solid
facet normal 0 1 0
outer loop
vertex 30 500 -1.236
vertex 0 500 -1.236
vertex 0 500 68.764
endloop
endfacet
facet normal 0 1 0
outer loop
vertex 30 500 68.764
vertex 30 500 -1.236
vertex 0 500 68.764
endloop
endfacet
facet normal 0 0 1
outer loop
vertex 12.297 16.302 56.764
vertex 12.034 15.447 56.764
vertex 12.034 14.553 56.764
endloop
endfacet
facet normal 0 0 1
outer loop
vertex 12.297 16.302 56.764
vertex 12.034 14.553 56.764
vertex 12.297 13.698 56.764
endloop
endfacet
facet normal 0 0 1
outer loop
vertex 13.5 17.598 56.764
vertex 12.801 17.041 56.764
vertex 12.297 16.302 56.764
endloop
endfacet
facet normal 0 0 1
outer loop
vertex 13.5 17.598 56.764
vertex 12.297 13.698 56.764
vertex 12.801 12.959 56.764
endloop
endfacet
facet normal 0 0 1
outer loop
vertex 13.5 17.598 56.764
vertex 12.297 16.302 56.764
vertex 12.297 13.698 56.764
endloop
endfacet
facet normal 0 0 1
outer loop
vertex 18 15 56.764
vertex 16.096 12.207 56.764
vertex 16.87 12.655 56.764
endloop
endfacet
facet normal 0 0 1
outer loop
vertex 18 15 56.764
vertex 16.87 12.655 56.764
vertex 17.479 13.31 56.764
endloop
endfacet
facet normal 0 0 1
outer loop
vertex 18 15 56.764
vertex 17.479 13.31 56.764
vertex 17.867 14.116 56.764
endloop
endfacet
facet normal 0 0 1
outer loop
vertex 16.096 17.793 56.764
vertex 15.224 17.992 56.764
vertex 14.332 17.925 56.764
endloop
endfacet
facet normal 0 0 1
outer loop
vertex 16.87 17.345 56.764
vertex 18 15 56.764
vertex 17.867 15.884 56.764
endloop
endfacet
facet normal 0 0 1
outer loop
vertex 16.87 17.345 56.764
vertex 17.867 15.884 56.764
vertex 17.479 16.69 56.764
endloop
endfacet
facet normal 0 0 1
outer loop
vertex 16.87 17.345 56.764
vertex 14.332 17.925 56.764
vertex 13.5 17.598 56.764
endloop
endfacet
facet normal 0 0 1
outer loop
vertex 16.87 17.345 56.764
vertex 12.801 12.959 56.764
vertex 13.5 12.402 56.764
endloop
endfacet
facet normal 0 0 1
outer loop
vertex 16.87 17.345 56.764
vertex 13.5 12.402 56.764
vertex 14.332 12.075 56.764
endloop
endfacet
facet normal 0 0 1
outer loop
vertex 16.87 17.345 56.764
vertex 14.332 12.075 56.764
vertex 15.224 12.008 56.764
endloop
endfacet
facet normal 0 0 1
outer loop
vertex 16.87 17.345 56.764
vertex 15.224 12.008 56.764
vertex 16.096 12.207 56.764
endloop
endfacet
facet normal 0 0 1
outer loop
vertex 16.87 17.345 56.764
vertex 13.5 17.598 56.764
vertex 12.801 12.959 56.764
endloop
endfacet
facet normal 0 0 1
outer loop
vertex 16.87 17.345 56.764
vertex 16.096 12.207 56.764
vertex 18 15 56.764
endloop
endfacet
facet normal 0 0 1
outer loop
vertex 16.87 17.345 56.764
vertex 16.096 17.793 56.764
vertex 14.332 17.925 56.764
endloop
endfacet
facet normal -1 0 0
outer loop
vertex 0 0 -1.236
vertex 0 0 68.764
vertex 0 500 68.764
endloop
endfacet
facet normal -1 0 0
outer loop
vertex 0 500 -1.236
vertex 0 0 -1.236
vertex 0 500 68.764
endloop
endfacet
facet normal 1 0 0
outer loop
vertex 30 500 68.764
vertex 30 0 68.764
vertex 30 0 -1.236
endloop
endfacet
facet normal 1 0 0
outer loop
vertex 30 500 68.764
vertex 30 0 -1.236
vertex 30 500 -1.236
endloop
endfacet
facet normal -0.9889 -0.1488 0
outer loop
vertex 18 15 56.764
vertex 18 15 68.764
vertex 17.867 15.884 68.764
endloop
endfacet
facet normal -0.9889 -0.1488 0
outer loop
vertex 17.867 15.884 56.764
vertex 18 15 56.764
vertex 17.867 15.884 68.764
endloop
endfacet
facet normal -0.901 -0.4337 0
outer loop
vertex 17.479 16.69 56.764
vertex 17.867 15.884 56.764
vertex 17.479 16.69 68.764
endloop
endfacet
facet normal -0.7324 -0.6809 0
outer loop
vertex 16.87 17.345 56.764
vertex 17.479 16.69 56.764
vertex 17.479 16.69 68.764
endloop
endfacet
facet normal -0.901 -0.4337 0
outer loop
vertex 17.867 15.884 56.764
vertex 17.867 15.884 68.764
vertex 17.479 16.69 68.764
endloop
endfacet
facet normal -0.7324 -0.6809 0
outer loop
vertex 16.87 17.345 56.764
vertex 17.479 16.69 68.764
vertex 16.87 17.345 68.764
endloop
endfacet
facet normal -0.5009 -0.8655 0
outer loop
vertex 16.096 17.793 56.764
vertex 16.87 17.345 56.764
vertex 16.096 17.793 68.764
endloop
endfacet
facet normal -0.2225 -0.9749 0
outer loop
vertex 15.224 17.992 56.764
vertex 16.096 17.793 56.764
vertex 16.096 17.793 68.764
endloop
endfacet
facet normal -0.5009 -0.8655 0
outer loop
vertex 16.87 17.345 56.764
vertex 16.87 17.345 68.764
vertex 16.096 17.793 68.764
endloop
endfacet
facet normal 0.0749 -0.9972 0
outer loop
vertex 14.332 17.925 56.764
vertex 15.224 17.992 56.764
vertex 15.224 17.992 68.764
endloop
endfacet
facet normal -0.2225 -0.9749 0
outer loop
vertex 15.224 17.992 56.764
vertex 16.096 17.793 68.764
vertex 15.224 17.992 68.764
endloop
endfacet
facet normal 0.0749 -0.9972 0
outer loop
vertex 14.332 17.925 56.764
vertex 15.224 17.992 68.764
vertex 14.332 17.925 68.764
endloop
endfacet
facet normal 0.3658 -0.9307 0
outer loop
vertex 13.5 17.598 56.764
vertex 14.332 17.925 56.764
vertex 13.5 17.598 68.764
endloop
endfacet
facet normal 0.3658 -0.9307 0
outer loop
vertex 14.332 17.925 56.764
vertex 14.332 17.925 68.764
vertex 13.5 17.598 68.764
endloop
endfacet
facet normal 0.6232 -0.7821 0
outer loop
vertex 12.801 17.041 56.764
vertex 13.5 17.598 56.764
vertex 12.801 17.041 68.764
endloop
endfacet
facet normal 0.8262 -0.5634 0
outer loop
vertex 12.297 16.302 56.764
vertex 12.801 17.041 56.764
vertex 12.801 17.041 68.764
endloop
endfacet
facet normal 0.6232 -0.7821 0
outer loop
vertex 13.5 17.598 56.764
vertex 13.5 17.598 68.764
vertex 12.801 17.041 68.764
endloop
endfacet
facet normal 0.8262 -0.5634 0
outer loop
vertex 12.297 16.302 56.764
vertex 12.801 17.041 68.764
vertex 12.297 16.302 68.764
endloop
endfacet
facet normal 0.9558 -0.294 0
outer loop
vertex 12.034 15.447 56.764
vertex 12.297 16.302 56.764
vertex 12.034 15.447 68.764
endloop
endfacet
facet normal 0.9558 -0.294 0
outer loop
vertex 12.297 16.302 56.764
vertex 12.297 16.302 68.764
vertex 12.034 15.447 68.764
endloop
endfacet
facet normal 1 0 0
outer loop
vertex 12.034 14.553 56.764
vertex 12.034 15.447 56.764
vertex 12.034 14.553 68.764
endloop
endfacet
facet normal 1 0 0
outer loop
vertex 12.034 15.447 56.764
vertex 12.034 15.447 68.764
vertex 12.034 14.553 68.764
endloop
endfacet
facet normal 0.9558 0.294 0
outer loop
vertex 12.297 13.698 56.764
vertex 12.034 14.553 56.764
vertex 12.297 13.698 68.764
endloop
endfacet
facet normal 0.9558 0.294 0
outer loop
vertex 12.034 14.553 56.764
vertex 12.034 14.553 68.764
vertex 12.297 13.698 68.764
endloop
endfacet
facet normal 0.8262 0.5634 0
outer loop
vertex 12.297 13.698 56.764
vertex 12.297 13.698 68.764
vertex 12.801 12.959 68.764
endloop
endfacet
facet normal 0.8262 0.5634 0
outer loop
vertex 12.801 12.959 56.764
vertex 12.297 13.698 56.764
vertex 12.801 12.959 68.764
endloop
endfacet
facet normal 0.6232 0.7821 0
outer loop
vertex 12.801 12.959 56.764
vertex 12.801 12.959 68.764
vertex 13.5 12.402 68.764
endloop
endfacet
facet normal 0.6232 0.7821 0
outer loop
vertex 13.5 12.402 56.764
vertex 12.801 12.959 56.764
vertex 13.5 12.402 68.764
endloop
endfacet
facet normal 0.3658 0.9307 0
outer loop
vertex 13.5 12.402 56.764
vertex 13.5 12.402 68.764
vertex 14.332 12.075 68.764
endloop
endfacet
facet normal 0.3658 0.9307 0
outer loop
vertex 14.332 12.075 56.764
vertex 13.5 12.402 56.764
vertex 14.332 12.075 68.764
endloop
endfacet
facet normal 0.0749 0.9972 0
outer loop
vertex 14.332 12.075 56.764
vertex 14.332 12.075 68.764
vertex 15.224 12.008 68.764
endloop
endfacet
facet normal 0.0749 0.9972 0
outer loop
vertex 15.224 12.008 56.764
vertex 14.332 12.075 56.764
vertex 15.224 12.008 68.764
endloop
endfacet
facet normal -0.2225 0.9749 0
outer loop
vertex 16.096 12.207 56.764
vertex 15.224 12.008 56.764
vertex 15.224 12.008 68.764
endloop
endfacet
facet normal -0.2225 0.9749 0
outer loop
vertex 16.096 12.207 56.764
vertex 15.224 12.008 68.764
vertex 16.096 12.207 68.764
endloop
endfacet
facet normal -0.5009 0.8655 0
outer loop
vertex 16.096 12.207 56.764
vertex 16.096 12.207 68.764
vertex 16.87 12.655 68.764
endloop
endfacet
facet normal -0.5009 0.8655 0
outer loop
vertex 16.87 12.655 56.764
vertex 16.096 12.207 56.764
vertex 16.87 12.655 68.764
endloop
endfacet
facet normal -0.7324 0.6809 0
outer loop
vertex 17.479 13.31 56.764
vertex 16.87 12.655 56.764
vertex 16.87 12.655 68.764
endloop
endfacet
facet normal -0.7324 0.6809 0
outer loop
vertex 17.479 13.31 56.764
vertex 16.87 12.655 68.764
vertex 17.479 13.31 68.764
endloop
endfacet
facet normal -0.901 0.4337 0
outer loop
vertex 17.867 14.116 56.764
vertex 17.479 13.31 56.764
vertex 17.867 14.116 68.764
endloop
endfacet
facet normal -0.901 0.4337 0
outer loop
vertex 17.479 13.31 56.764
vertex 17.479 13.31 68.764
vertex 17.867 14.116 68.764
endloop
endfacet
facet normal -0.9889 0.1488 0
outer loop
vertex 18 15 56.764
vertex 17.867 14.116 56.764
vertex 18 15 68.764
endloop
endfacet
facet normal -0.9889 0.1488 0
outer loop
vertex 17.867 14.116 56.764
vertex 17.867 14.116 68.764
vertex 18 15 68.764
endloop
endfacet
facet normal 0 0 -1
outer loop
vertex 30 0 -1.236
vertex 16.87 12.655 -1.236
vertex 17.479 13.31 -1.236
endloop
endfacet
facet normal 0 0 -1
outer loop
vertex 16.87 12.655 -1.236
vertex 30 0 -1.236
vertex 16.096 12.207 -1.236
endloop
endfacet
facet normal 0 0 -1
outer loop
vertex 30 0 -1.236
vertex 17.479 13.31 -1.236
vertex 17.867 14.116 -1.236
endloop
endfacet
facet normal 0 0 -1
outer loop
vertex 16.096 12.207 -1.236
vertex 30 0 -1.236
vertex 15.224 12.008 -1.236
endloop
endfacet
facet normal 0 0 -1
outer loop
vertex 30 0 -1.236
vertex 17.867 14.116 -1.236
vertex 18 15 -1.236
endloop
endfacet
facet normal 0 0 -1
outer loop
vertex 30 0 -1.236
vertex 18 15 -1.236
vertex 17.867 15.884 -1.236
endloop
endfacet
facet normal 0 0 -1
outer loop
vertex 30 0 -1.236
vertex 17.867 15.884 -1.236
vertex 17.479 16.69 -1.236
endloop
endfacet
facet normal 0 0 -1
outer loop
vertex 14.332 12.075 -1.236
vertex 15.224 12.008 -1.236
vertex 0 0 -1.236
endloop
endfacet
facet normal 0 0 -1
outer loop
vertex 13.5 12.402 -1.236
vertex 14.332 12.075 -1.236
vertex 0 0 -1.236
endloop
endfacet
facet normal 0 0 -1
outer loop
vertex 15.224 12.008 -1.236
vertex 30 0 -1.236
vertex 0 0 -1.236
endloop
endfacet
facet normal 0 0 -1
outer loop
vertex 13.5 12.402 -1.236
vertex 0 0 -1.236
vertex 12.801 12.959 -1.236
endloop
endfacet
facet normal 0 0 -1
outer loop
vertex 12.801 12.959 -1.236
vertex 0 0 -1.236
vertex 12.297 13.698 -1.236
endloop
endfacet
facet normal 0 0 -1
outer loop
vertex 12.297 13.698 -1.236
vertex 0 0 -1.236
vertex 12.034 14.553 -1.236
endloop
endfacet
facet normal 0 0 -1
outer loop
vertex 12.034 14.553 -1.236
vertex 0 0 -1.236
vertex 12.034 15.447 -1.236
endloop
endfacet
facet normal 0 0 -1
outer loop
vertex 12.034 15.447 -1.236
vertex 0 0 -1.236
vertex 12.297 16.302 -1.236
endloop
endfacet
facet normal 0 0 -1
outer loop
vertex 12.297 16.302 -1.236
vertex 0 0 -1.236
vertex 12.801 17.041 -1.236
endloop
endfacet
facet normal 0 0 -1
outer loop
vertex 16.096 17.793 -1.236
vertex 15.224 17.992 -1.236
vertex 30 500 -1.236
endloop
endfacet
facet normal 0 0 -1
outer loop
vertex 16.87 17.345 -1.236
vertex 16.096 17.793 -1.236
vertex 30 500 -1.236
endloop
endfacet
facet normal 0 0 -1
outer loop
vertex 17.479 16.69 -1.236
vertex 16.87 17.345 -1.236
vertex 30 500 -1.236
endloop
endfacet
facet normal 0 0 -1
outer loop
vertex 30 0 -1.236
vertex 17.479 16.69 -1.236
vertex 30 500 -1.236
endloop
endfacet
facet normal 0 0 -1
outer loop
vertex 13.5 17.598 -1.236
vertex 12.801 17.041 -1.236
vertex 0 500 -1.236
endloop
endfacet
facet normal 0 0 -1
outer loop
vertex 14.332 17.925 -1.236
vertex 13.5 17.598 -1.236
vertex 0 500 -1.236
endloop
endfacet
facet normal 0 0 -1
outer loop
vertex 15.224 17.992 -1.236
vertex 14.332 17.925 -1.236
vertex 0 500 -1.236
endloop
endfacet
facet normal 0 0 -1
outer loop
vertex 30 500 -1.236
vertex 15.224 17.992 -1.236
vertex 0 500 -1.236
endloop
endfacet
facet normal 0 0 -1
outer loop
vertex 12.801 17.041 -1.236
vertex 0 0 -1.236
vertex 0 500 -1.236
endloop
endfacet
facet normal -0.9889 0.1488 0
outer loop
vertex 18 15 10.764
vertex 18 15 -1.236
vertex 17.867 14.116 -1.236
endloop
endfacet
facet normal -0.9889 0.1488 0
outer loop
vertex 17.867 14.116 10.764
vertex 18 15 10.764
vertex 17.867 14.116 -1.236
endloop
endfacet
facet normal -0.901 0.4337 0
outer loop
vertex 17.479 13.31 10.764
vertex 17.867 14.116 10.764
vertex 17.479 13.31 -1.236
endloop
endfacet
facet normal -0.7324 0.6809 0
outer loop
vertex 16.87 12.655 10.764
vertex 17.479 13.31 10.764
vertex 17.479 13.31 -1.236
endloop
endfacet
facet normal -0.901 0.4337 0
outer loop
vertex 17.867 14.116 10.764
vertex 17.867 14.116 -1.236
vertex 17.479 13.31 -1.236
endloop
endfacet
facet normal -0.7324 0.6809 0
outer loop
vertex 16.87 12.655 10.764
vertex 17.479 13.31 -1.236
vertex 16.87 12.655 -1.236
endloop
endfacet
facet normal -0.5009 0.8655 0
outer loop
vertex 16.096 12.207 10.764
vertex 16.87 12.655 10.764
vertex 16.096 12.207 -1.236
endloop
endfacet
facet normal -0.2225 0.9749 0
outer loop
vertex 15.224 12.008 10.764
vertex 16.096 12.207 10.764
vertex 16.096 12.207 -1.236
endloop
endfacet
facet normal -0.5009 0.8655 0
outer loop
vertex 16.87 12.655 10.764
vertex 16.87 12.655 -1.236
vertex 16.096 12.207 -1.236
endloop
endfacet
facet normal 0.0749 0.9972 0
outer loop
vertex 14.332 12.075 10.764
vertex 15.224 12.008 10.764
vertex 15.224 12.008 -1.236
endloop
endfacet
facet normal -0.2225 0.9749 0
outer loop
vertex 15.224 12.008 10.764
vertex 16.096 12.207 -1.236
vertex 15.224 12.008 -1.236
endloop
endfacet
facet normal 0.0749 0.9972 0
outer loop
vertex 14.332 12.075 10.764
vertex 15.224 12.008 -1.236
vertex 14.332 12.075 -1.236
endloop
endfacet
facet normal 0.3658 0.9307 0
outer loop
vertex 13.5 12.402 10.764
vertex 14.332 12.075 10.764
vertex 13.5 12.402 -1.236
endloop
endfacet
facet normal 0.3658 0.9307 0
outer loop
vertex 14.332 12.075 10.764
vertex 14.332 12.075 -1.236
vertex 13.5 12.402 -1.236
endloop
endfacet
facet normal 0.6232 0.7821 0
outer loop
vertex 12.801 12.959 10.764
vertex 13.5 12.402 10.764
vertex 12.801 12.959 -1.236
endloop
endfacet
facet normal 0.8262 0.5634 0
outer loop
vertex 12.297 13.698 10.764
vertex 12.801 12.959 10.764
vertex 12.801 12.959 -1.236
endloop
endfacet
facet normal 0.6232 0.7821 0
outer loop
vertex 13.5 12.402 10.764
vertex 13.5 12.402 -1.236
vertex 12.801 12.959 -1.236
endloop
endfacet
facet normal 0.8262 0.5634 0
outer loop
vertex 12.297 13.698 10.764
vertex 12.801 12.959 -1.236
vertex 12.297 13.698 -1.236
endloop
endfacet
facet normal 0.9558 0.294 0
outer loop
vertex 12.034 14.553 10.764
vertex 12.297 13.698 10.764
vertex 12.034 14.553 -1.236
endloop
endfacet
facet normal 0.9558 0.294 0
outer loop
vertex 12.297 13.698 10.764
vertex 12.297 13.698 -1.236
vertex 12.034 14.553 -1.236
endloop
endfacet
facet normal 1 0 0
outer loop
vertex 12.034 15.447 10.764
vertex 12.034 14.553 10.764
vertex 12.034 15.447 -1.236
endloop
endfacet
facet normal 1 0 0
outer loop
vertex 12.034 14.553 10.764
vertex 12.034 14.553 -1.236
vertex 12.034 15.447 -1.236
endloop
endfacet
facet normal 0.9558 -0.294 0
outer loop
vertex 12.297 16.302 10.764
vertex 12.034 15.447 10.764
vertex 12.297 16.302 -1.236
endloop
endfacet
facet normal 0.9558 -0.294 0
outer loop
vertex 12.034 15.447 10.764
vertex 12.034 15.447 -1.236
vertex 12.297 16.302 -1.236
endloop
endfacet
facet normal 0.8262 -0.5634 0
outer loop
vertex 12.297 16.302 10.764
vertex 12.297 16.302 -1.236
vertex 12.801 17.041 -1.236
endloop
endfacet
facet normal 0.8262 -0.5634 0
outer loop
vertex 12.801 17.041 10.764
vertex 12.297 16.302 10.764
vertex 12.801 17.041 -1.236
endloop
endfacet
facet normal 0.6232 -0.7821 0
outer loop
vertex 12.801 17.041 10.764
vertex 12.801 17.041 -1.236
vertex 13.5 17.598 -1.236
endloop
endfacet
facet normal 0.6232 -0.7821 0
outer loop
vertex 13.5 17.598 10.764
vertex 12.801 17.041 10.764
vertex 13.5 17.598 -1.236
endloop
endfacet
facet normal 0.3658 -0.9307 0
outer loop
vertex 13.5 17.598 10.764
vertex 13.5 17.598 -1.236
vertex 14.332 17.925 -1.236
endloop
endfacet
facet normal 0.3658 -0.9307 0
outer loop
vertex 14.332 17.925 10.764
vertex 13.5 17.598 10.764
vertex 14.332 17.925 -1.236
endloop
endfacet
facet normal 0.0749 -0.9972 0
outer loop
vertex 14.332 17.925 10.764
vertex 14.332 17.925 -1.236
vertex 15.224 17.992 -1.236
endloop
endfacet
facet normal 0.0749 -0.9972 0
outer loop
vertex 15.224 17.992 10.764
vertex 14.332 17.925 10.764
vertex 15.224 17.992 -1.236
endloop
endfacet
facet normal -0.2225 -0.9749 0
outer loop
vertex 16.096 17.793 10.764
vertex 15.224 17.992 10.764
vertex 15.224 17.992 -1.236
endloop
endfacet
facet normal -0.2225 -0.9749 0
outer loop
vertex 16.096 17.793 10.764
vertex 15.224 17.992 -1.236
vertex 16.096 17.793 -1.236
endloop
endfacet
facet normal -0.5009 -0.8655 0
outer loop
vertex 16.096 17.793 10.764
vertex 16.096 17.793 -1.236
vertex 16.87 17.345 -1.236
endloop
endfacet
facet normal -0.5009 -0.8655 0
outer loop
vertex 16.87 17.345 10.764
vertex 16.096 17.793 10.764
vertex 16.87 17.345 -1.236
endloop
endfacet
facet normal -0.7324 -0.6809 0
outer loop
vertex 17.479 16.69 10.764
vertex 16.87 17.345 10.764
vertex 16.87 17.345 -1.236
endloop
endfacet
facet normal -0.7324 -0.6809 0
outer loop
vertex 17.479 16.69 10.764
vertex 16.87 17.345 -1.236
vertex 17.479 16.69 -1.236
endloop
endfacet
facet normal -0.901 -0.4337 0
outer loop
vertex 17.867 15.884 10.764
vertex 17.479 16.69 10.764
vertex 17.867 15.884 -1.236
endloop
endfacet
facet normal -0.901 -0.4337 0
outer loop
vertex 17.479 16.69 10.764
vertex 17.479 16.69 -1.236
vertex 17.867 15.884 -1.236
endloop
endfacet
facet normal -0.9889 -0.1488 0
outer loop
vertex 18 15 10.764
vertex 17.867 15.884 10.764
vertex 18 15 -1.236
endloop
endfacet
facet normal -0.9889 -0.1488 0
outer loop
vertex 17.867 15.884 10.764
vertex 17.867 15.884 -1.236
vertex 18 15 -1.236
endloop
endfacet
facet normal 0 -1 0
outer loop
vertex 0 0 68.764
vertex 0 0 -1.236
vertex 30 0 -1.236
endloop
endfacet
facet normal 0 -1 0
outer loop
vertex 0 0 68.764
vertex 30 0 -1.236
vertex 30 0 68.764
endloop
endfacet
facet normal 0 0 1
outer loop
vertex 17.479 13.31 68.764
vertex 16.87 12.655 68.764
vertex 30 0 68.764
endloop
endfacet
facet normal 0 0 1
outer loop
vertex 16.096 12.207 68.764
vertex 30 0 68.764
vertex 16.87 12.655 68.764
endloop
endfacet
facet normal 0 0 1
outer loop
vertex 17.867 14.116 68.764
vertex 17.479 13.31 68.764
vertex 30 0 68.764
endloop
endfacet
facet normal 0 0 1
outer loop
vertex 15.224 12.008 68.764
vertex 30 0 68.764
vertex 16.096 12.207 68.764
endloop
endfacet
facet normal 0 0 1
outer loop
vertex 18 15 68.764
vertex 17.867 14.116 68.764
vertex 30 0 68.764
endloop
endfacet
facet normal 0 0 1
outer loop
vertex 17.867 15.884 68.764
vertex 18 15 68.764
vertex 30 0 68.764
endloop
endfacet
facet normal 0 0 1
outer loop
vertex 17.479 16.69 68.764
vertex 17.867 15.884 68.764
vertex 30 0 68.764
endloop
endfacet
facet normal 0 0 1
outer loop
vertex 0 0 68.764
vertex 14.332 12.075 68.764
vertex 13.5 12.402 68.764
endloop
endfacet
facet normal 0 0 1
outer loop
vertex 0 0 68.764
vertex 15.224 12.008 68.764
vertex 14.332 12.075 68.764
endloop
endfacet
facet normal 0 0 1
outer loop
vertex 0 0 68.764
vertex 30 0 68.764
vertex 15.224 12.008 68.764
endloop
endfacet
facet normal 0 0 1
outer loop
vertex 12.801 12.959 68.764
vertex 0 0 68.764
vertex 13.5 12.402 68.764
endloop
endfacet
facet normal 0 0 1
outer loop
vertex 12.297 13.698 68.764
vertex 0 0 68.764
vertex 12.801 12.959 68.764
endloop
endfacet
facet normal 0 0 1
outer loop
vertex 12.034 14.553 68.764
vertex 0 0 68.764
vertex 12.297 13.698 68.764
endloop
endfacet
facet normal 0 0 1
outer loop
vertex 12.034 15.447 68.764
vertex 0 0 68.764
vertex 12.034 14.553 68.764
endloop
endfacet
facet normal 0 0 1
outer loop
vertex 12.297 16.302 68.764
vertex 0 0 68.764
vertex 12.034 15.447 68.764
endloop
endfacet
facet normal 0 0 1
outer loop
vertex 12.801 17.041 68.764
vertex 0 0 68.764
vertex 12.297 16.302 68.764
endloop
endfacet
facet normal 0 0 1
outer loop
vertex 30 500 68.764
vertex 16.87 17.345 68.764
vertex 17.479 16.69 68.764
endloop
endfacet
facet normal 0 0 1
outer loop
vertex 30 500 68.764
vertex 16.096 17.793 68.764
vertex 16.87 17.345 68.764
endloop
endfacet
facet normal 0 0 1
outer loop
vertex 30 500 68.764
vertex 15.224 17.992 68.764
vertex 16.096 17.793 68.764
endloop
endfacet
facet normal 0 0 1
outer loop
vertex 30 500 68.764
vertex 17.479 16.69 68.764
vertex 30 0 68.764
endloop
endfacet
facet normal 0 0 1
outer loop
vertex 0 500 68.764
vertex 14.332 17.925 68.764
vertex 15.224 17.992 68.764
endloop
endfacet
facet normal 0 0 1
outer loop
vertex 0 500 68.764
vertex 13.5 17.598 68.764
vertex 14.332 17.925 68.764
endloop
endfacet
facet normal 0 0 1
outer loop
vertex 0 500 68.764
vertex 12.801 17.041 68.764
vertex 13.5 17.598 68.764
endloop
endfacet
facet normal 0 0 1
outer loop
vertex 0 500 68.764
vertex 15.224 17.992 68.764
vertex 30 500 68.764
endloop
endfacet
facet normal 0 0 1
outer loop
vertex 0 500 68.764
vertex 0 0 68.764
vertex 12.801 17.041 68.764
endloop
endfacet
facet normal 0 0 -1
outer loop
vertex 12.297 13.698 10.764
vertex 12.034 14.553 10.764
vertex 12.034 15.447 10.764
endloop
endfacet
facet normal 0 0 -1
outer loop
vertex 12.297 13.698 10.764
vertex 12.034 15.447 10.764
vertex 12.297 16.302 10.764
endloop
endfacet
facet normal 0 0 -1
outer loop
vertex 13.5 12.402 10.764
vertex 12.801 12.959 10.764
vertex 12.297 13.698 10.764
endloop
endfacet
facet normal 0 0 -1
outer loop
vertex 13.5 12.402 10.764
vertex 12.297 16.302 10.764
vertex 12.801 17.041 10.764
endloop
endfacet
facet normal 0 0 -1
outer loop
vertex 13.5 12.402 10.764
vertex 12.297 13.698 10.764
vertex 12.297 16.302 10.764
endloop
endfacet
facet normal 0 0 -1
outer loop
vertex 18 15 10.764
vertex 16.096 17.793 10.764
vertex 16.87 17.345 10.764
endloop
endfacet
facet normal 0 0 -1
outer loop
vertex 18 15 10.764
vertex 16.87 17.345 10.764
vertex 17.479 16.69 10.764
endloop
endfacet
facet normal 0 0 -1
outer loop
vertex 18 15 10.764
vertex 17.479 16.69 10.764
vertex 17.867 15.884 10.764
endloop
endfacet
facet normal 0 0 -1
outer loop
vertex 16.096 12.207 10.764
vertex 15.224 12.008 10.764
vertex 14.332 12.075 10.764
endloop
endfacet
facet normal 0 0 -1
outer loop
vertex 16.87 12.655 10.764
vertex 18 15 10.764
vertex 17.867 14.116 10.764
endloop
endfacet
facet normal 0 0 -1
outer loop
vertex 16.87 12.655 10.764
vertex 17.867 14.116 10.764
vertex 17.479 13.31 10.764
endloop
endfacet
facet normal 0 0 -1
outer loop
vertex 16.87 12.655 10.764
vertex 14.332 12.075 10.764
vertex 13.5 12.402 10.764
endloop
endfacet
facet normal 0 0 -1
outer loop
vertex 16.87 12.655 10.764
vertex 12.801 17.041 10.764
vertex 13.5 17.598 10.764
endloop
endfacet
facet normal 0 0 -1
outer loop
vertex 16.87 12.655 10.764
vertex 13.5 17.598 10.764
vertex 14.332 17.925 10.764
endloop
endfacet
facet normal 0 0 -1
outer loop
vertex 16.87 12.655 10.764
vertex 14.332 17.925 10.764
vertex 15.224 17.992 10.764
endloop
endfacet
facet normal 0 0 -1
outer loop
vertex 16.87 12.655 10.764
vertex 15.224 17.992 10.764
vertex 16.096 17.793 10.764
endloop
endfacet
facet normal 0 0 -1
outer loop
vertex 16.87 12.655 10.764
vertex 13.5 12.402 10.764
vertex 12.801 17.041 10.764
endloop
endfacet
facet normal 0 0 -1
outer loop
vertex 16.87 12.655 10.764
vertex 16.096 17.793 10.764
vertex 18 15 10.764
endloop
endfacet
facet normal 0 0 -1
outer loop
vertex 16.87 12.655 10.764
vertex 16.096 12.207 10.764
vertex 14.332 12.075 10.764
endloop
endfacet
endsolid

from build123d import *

# Parameters (mm, degrees)
F0_W     = 500
F0_H     = 70
F1_DEPTH = 30
F2_R     = 3
F3_DEPTH = 12
F4_R     = 3
F5_DEPTH = 12


with BuildPart() as f1:
    # F0 (on Right) → F1 (new body)
    with BuildSketch(Plane.YZ):
        with Locations((250, 33.764381)):
            Rectangle(F0_W, F0_H)
    extrude(amount=F1_DEPTH)

    # F2 (on face) → F3 (cut)
    with BuildSketch(Plane.XY.offset(68.764381)):
        with Locations((15, 15)):
            Circle(F2_R)
    extrude(amount=-F3_DEPTH, mode=Mode.SUBTRACT)

    # F4 (on face) → F5 (cut)
    with BuildSketch(Plane(origin=(0, 0, -1.235619), x_dir=(1, 0, 0), z_dir=(0, 0, -1))):
        with Locations((15, -15)):
            Circle(F4_R)
    extrude(amount=-F5_DEPTH, mode=Mode.SUBTRACT)


solid = f1.part
